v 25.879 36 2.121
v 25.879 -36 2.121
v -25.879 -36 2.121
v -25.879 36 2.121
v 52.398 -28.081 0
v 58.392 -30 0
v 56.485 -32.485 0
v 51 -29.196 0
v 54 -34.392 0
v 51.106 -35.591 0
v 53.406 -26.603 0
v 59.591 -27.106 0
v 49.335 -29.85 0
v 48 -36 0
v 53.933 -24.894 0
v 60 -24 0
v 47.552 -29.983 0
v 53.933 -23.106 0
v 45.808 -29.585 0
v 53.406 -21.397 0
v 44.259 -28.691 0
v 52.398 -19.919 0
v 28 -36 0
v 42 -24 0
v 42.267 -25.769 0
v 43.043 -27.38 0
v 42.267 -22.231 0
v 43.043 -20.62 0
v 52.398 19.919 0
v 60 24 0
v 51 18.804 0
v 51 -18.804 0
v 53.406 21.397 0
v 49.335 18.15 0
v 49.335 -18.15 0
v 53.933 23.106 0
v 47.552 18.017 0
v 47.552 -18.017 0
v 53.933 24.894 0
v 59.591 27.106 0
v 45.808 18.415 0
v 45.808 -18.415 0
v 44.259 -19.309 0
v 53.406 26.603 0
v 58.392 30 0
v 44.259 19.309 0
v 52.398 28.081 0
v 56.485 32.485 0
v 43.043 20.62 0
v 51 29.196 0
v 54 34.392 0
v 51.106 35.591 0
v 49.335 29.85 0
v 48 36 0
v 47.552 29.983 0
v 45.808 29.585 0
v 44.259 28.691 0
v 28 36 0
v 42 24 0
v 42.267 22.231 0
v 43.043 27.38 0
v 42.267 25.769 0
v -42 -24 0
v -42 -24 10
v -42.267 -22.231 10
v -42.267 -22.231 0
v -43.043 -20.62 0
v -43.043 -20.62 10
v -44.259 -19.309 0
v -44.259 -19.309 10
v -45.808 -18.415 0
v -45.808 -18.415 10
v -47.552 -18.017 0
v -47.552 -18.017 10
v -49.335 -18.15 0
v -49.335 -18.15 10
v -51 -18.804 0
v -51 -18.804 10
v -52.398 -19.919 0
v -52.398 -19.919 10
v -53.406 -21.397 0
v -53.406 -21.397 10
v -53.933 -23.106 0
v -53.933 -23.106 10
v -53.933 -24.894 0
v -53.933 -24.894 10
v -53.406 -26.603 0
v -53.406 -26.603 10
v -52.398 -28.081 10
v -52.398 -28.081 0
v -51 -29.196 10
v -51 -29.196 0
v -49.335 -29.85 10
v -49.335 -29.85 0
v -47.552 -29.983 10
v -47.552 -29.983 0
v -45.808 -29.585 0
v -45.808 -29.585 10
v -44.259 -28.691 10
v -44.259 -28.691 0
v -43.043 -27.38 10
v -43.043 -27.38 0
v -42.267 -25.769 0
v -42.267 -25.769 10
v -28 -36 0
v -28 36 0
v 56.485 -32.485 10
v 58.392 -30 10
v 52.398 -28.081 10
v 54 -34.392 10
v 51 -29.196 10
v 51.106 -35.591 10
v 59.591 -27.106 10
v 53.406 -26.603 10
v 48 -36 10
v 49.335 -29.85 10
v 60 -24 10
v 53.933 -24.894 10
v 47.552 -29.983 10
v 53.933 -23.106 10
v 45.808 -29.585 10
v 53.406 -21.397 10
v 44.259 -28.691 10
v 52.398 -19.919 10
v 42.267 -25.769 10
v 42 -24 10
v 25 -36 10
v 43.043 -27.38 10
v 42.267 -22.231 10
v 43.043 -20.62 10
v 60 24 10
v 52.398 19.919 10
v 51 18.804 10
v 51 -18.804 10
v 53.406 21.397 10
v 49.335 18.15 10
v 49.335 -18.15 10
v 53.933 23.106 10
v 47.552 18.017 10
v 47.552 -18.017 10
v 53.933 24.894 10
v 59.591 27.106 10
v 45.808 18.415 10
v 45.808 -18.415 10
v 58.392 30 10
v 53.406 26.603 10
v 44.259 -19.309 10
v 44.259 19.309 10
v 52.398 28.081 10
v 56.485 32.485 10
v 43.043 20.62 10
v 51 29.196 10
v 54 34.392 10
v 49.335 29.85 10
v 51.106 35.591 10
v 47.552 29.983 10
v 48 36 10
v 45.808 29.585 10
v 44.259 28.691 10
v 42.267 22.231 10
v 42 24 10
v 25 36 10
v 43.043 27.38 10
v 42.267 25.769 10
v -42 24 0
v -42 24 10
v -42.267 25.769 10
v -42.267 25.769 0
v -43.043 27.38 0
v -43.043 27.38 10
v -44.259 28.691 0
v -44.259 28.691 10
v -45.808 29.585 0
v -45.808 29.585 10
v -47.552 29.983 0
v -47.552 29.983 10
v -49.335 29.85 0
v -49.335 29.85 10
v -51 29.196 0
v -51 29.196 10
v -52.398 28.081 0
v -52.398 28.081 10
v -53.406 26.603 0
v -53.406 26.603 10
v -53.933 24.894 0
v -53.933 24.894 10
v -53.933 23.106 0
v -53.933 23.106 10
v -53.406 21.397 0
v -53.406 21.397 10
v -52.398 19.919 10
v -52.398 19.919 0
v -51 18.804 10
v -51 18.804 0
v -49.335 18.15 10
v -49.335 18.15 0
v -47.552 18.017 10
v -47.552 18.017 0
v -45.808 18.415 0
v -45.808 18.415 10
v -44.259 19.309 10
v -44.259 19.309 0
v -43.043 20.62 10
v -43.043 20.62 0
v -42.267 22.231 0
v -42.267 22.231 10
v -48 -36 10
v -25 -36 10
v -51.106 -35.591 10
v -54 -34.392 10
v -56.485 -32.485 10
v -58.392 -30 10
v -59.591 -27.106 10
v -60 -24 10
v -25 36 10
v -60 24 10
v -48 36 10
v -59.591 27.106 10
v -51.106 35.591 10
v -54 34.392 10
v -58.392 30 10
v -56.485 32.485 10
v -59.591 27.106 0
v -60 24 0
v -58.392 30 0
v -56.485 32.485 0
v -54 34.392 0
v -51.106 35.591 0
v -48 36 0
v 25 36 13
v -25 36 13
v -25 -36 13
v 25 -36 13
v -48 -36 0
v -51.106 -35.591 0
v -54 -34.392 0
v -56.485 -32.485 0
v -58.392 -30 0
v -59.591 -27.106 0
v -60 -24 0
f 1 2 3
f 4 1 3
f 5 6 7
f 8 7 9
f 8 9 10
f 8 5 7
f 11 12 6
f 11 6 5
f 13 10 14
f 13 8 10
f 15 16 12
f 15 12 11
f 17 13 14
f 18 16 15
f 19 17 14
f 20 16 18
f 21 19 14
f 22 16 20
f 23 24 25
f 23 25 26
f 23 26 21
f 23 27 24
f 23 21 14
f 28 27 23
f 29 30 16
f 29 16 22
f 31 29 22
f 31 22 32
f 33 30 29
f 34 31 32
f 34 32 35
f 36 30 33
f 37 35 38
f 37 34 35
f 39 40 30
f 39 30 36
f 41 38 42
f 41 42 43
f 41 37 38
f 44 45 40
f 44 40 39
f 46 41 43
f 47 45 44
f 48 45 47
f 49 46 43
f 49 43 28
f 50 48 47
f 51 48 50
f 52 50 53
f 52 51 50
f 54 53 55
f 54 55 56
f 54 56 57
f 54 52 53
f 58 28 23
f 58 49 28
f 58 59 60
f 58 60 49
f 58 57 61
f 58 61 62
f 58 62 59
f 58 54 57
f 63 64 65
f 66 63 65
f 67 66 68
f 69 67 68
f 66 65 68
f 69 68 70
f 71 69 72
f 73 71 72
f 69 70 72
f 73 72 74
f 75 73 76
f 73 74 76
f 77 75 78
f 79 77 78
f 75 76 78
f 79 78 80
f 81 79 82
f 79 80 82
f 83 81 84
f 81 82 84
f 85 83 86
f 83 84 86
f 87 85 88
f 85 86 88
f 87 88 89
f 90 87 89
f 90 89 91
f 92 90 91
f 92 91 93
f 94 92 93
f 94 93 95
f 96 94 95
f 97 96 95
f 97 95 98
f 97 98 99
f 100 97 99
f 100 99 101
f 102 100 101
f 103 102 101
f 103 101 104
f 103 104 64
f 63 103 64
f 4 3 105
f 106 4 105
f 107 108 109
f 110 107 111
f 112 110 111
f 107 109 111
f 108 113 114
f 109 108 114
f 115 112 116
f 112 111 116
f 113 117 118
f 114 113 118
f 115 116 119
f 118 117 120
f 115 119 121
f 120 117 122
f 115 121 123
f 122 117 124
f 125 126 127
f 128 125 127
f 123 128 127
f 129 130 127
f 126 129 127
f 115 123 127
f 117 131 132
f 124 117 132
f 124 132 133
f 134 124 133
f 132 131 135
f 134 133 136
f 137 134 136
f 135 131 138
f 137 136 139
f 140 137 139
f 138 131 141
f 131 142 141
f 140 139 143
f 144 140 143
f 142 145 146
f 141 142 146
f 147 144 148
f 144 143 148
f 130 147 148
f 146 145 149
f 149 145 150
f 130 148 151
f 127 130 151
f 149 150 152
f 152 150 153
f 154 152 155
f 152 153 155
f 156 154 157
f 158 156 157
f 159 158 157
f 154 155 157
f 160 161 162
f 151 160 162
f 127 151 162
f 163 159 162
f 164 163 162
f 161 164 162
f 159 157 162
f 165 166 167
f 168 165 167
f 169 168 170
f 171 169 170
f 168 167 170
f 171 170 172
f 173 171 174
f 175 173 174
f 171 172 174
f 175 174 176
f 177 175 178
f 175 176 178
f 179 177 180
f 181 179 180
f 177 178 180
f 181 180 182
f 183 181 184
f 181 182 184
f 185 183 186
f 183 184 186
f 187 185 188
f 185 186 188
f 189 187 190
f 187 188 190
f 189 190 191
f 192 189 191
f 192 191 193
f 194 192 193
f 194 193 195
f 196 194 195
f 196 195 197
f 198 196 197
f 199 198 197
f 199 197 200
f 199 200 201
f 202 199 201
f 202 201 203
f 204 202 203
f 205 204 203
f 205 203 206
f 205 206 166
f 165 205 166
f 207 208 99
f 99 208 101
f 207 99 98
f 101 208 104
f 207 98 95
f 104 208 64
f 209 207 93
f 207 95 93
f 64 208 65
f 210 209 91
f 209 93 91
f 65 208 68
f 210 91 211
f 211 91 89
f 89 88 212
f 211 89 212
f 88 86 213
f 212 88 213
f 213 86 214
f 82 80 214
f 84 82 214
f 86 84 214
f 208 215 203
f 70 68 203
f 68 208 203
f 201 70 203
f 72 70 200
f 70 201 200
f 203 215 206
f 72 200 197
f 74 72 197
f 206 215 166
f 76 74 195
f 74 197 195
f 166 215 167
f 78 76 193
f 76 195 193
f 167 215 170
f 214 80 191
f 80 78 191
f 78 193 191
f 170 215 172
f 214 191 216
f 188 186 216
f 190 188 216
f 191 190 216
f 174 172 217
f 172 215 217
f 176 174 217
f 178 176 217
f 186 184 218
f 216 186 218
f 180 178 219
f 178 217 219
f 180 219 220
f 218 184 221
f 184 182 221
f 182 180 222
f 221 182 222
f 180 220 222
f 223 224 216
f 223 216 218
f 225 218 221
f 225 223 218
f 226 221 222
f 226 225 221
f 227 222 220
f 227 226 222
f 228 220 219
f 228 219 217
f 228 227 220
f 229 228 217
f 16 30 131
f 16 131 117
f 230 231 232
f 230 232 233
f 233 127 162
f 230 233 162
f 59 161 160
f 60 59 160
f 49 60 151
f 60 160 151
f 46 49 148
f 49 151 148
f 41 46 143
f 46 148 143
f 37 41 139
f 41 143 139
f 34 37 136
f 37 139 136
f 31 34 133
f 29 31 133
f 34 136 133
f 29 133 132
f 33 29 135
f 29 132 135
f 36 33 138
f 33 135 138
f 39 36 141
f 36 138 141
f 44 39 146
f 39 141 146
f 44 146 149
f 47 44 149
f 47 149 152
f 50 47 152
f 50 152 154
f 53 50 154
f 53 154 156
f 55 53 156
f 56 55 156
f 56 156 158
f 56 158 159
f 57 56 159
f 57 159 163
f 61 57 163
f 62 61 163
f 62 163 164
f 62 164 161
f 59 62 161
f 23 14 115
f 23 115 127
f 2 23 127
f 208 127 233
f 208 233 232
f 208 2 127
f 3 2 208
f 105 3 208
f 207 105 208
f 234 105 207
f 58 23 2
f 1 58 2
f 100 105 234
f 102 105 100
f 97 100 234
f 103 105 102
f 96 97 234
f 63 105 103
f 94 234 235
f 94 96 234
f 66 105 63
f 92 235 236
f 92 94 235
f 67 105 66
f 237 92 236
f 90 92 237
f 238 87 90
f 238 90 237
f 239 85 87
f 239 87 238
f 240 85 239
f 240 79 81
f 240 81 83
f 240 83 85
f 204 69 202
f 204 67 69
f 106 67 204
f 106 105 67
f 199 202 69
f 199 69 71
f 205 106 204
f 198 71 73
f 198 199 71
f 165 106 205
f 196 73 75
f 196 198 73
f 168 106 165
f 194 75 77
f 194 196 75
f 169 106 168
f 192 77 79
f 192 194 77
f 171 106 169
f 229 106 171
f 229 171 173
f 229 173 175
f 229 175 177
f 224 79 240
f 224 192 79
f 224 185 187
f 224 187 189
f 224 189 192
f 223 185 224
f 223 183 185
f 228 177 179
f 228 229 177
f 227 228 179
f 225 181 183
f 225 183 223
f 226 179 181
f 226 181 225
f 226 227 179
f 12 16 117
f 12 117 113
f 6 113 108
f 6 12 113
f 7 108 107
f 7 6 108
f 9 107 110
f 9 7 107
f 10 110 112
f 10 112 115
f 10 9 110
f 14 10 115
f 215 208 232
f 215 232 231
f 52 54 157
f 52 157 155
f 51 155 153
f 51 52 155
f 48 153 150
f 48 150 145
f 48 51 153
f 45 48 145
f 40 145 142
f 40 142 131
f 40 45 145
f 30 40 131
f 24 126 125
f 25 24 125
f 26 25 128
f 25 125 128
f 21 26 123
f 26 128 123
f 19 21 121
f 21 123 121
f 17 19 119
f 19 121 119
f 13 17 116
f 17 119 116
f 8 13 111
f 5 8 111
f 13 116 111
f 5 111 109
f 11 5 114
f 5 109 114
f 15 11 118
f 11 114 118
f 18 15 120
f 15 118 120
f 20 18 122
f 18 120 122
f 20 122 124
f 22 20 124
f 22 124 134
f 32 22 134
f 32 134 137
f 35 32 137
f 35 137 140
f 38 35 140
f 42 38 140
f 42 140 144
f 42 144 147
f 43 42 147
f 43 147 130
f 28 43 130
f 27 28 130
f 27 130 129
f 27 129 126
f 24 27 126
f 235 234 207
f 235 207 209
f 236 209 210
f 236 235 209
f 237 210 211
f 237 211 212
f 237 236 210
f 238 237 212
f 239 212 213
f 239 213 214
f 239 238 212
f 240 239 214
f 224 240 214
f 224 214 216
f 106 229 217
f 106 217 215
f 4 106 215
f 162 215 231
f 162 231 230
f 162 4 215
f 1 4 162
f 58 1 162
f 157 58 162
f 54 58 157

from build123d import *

# Parameters (mm, degrees)
BOSS_EXTRUDE1_DEPTH = 10
SKETCH2_R           = 6
CUT_EXTRUDE1_DEPTH  = 71.682388188
CUT_EXTRUDE2_DEPTH  = 95.254973344
SKETCH4_W           = 50
SKETCH4_H           = 72
BOSS_EXTRUDE2_DEPTH = 3


with BuildPart() as part:
    # Sketch1 → Boss-Extrude1 (new body)
    with BuildSketch(Plane.XY):
        with BuildLine():
            Line((-48, 36), (48, 36))
            ThreePointArc((48, 36), (56.485281374, 32.485281374), (60, 24))
            Line((60, 24), (60, -24))
            ThreePointArc((60, -24), (56.485281374, -32.485281374), (48, -36))
            Line((48, -36), (-48, -36))
            ThreePointArc((-48, -36), (-56.485281374, -32.485281374), (-60, -24))
            Line((-60, -24), (-60, 24))
            ThreePointArc((-60, 24), (-56.485281374, 32.485281374), (-48, 36))
        make_face()
    extrude(amount=BOSS_EXTRUDE1_DEPTH)

    # Sketch2 → Cut-Extrude1 (cut, through all)
    with BuildSketch(Plane.XY.offset(10)):
        with Locations((-48, 24)):
            Circle(SKETCH2_R)
        with Locations((-48, -24)):
            Circle(SKETCH2_R)
        with Locations(Location((48, -24, 0), (0, 0, 180))):
            Circle(SKETCH2_R)
        with Locations(Location((48, 24, 0), (0, 0, 180))):
            Circle(SKETCH2_R)
    extrude(amount=-CUT_EXTRUDE1_DEPTH, mode=Mode.SUBTRACT)

    # Sketch3 → Cut-Extrude2 (cut, through all)
    with BuildSketch(Plane.XZ.offset(36)):
        Polygon((-28, 0), (28, 0), (25.878679656, 2.121320344), (-25.878679656, 2.121320344), align=None)
    extrude(amount=-CUT_EXTRUDE2_DEPTH, mode=Mode.SUBTRACT)

    # Sketch4 → Boss-Extrude2 (add)
    with BuildSketch(Plane.XY.offset(10)):
        Rectangle(SKETCH4_W, SKETCH4_H)
    extrude(amount=BOSS_EXTRUDE2_DEPTH)


solid = part.part
